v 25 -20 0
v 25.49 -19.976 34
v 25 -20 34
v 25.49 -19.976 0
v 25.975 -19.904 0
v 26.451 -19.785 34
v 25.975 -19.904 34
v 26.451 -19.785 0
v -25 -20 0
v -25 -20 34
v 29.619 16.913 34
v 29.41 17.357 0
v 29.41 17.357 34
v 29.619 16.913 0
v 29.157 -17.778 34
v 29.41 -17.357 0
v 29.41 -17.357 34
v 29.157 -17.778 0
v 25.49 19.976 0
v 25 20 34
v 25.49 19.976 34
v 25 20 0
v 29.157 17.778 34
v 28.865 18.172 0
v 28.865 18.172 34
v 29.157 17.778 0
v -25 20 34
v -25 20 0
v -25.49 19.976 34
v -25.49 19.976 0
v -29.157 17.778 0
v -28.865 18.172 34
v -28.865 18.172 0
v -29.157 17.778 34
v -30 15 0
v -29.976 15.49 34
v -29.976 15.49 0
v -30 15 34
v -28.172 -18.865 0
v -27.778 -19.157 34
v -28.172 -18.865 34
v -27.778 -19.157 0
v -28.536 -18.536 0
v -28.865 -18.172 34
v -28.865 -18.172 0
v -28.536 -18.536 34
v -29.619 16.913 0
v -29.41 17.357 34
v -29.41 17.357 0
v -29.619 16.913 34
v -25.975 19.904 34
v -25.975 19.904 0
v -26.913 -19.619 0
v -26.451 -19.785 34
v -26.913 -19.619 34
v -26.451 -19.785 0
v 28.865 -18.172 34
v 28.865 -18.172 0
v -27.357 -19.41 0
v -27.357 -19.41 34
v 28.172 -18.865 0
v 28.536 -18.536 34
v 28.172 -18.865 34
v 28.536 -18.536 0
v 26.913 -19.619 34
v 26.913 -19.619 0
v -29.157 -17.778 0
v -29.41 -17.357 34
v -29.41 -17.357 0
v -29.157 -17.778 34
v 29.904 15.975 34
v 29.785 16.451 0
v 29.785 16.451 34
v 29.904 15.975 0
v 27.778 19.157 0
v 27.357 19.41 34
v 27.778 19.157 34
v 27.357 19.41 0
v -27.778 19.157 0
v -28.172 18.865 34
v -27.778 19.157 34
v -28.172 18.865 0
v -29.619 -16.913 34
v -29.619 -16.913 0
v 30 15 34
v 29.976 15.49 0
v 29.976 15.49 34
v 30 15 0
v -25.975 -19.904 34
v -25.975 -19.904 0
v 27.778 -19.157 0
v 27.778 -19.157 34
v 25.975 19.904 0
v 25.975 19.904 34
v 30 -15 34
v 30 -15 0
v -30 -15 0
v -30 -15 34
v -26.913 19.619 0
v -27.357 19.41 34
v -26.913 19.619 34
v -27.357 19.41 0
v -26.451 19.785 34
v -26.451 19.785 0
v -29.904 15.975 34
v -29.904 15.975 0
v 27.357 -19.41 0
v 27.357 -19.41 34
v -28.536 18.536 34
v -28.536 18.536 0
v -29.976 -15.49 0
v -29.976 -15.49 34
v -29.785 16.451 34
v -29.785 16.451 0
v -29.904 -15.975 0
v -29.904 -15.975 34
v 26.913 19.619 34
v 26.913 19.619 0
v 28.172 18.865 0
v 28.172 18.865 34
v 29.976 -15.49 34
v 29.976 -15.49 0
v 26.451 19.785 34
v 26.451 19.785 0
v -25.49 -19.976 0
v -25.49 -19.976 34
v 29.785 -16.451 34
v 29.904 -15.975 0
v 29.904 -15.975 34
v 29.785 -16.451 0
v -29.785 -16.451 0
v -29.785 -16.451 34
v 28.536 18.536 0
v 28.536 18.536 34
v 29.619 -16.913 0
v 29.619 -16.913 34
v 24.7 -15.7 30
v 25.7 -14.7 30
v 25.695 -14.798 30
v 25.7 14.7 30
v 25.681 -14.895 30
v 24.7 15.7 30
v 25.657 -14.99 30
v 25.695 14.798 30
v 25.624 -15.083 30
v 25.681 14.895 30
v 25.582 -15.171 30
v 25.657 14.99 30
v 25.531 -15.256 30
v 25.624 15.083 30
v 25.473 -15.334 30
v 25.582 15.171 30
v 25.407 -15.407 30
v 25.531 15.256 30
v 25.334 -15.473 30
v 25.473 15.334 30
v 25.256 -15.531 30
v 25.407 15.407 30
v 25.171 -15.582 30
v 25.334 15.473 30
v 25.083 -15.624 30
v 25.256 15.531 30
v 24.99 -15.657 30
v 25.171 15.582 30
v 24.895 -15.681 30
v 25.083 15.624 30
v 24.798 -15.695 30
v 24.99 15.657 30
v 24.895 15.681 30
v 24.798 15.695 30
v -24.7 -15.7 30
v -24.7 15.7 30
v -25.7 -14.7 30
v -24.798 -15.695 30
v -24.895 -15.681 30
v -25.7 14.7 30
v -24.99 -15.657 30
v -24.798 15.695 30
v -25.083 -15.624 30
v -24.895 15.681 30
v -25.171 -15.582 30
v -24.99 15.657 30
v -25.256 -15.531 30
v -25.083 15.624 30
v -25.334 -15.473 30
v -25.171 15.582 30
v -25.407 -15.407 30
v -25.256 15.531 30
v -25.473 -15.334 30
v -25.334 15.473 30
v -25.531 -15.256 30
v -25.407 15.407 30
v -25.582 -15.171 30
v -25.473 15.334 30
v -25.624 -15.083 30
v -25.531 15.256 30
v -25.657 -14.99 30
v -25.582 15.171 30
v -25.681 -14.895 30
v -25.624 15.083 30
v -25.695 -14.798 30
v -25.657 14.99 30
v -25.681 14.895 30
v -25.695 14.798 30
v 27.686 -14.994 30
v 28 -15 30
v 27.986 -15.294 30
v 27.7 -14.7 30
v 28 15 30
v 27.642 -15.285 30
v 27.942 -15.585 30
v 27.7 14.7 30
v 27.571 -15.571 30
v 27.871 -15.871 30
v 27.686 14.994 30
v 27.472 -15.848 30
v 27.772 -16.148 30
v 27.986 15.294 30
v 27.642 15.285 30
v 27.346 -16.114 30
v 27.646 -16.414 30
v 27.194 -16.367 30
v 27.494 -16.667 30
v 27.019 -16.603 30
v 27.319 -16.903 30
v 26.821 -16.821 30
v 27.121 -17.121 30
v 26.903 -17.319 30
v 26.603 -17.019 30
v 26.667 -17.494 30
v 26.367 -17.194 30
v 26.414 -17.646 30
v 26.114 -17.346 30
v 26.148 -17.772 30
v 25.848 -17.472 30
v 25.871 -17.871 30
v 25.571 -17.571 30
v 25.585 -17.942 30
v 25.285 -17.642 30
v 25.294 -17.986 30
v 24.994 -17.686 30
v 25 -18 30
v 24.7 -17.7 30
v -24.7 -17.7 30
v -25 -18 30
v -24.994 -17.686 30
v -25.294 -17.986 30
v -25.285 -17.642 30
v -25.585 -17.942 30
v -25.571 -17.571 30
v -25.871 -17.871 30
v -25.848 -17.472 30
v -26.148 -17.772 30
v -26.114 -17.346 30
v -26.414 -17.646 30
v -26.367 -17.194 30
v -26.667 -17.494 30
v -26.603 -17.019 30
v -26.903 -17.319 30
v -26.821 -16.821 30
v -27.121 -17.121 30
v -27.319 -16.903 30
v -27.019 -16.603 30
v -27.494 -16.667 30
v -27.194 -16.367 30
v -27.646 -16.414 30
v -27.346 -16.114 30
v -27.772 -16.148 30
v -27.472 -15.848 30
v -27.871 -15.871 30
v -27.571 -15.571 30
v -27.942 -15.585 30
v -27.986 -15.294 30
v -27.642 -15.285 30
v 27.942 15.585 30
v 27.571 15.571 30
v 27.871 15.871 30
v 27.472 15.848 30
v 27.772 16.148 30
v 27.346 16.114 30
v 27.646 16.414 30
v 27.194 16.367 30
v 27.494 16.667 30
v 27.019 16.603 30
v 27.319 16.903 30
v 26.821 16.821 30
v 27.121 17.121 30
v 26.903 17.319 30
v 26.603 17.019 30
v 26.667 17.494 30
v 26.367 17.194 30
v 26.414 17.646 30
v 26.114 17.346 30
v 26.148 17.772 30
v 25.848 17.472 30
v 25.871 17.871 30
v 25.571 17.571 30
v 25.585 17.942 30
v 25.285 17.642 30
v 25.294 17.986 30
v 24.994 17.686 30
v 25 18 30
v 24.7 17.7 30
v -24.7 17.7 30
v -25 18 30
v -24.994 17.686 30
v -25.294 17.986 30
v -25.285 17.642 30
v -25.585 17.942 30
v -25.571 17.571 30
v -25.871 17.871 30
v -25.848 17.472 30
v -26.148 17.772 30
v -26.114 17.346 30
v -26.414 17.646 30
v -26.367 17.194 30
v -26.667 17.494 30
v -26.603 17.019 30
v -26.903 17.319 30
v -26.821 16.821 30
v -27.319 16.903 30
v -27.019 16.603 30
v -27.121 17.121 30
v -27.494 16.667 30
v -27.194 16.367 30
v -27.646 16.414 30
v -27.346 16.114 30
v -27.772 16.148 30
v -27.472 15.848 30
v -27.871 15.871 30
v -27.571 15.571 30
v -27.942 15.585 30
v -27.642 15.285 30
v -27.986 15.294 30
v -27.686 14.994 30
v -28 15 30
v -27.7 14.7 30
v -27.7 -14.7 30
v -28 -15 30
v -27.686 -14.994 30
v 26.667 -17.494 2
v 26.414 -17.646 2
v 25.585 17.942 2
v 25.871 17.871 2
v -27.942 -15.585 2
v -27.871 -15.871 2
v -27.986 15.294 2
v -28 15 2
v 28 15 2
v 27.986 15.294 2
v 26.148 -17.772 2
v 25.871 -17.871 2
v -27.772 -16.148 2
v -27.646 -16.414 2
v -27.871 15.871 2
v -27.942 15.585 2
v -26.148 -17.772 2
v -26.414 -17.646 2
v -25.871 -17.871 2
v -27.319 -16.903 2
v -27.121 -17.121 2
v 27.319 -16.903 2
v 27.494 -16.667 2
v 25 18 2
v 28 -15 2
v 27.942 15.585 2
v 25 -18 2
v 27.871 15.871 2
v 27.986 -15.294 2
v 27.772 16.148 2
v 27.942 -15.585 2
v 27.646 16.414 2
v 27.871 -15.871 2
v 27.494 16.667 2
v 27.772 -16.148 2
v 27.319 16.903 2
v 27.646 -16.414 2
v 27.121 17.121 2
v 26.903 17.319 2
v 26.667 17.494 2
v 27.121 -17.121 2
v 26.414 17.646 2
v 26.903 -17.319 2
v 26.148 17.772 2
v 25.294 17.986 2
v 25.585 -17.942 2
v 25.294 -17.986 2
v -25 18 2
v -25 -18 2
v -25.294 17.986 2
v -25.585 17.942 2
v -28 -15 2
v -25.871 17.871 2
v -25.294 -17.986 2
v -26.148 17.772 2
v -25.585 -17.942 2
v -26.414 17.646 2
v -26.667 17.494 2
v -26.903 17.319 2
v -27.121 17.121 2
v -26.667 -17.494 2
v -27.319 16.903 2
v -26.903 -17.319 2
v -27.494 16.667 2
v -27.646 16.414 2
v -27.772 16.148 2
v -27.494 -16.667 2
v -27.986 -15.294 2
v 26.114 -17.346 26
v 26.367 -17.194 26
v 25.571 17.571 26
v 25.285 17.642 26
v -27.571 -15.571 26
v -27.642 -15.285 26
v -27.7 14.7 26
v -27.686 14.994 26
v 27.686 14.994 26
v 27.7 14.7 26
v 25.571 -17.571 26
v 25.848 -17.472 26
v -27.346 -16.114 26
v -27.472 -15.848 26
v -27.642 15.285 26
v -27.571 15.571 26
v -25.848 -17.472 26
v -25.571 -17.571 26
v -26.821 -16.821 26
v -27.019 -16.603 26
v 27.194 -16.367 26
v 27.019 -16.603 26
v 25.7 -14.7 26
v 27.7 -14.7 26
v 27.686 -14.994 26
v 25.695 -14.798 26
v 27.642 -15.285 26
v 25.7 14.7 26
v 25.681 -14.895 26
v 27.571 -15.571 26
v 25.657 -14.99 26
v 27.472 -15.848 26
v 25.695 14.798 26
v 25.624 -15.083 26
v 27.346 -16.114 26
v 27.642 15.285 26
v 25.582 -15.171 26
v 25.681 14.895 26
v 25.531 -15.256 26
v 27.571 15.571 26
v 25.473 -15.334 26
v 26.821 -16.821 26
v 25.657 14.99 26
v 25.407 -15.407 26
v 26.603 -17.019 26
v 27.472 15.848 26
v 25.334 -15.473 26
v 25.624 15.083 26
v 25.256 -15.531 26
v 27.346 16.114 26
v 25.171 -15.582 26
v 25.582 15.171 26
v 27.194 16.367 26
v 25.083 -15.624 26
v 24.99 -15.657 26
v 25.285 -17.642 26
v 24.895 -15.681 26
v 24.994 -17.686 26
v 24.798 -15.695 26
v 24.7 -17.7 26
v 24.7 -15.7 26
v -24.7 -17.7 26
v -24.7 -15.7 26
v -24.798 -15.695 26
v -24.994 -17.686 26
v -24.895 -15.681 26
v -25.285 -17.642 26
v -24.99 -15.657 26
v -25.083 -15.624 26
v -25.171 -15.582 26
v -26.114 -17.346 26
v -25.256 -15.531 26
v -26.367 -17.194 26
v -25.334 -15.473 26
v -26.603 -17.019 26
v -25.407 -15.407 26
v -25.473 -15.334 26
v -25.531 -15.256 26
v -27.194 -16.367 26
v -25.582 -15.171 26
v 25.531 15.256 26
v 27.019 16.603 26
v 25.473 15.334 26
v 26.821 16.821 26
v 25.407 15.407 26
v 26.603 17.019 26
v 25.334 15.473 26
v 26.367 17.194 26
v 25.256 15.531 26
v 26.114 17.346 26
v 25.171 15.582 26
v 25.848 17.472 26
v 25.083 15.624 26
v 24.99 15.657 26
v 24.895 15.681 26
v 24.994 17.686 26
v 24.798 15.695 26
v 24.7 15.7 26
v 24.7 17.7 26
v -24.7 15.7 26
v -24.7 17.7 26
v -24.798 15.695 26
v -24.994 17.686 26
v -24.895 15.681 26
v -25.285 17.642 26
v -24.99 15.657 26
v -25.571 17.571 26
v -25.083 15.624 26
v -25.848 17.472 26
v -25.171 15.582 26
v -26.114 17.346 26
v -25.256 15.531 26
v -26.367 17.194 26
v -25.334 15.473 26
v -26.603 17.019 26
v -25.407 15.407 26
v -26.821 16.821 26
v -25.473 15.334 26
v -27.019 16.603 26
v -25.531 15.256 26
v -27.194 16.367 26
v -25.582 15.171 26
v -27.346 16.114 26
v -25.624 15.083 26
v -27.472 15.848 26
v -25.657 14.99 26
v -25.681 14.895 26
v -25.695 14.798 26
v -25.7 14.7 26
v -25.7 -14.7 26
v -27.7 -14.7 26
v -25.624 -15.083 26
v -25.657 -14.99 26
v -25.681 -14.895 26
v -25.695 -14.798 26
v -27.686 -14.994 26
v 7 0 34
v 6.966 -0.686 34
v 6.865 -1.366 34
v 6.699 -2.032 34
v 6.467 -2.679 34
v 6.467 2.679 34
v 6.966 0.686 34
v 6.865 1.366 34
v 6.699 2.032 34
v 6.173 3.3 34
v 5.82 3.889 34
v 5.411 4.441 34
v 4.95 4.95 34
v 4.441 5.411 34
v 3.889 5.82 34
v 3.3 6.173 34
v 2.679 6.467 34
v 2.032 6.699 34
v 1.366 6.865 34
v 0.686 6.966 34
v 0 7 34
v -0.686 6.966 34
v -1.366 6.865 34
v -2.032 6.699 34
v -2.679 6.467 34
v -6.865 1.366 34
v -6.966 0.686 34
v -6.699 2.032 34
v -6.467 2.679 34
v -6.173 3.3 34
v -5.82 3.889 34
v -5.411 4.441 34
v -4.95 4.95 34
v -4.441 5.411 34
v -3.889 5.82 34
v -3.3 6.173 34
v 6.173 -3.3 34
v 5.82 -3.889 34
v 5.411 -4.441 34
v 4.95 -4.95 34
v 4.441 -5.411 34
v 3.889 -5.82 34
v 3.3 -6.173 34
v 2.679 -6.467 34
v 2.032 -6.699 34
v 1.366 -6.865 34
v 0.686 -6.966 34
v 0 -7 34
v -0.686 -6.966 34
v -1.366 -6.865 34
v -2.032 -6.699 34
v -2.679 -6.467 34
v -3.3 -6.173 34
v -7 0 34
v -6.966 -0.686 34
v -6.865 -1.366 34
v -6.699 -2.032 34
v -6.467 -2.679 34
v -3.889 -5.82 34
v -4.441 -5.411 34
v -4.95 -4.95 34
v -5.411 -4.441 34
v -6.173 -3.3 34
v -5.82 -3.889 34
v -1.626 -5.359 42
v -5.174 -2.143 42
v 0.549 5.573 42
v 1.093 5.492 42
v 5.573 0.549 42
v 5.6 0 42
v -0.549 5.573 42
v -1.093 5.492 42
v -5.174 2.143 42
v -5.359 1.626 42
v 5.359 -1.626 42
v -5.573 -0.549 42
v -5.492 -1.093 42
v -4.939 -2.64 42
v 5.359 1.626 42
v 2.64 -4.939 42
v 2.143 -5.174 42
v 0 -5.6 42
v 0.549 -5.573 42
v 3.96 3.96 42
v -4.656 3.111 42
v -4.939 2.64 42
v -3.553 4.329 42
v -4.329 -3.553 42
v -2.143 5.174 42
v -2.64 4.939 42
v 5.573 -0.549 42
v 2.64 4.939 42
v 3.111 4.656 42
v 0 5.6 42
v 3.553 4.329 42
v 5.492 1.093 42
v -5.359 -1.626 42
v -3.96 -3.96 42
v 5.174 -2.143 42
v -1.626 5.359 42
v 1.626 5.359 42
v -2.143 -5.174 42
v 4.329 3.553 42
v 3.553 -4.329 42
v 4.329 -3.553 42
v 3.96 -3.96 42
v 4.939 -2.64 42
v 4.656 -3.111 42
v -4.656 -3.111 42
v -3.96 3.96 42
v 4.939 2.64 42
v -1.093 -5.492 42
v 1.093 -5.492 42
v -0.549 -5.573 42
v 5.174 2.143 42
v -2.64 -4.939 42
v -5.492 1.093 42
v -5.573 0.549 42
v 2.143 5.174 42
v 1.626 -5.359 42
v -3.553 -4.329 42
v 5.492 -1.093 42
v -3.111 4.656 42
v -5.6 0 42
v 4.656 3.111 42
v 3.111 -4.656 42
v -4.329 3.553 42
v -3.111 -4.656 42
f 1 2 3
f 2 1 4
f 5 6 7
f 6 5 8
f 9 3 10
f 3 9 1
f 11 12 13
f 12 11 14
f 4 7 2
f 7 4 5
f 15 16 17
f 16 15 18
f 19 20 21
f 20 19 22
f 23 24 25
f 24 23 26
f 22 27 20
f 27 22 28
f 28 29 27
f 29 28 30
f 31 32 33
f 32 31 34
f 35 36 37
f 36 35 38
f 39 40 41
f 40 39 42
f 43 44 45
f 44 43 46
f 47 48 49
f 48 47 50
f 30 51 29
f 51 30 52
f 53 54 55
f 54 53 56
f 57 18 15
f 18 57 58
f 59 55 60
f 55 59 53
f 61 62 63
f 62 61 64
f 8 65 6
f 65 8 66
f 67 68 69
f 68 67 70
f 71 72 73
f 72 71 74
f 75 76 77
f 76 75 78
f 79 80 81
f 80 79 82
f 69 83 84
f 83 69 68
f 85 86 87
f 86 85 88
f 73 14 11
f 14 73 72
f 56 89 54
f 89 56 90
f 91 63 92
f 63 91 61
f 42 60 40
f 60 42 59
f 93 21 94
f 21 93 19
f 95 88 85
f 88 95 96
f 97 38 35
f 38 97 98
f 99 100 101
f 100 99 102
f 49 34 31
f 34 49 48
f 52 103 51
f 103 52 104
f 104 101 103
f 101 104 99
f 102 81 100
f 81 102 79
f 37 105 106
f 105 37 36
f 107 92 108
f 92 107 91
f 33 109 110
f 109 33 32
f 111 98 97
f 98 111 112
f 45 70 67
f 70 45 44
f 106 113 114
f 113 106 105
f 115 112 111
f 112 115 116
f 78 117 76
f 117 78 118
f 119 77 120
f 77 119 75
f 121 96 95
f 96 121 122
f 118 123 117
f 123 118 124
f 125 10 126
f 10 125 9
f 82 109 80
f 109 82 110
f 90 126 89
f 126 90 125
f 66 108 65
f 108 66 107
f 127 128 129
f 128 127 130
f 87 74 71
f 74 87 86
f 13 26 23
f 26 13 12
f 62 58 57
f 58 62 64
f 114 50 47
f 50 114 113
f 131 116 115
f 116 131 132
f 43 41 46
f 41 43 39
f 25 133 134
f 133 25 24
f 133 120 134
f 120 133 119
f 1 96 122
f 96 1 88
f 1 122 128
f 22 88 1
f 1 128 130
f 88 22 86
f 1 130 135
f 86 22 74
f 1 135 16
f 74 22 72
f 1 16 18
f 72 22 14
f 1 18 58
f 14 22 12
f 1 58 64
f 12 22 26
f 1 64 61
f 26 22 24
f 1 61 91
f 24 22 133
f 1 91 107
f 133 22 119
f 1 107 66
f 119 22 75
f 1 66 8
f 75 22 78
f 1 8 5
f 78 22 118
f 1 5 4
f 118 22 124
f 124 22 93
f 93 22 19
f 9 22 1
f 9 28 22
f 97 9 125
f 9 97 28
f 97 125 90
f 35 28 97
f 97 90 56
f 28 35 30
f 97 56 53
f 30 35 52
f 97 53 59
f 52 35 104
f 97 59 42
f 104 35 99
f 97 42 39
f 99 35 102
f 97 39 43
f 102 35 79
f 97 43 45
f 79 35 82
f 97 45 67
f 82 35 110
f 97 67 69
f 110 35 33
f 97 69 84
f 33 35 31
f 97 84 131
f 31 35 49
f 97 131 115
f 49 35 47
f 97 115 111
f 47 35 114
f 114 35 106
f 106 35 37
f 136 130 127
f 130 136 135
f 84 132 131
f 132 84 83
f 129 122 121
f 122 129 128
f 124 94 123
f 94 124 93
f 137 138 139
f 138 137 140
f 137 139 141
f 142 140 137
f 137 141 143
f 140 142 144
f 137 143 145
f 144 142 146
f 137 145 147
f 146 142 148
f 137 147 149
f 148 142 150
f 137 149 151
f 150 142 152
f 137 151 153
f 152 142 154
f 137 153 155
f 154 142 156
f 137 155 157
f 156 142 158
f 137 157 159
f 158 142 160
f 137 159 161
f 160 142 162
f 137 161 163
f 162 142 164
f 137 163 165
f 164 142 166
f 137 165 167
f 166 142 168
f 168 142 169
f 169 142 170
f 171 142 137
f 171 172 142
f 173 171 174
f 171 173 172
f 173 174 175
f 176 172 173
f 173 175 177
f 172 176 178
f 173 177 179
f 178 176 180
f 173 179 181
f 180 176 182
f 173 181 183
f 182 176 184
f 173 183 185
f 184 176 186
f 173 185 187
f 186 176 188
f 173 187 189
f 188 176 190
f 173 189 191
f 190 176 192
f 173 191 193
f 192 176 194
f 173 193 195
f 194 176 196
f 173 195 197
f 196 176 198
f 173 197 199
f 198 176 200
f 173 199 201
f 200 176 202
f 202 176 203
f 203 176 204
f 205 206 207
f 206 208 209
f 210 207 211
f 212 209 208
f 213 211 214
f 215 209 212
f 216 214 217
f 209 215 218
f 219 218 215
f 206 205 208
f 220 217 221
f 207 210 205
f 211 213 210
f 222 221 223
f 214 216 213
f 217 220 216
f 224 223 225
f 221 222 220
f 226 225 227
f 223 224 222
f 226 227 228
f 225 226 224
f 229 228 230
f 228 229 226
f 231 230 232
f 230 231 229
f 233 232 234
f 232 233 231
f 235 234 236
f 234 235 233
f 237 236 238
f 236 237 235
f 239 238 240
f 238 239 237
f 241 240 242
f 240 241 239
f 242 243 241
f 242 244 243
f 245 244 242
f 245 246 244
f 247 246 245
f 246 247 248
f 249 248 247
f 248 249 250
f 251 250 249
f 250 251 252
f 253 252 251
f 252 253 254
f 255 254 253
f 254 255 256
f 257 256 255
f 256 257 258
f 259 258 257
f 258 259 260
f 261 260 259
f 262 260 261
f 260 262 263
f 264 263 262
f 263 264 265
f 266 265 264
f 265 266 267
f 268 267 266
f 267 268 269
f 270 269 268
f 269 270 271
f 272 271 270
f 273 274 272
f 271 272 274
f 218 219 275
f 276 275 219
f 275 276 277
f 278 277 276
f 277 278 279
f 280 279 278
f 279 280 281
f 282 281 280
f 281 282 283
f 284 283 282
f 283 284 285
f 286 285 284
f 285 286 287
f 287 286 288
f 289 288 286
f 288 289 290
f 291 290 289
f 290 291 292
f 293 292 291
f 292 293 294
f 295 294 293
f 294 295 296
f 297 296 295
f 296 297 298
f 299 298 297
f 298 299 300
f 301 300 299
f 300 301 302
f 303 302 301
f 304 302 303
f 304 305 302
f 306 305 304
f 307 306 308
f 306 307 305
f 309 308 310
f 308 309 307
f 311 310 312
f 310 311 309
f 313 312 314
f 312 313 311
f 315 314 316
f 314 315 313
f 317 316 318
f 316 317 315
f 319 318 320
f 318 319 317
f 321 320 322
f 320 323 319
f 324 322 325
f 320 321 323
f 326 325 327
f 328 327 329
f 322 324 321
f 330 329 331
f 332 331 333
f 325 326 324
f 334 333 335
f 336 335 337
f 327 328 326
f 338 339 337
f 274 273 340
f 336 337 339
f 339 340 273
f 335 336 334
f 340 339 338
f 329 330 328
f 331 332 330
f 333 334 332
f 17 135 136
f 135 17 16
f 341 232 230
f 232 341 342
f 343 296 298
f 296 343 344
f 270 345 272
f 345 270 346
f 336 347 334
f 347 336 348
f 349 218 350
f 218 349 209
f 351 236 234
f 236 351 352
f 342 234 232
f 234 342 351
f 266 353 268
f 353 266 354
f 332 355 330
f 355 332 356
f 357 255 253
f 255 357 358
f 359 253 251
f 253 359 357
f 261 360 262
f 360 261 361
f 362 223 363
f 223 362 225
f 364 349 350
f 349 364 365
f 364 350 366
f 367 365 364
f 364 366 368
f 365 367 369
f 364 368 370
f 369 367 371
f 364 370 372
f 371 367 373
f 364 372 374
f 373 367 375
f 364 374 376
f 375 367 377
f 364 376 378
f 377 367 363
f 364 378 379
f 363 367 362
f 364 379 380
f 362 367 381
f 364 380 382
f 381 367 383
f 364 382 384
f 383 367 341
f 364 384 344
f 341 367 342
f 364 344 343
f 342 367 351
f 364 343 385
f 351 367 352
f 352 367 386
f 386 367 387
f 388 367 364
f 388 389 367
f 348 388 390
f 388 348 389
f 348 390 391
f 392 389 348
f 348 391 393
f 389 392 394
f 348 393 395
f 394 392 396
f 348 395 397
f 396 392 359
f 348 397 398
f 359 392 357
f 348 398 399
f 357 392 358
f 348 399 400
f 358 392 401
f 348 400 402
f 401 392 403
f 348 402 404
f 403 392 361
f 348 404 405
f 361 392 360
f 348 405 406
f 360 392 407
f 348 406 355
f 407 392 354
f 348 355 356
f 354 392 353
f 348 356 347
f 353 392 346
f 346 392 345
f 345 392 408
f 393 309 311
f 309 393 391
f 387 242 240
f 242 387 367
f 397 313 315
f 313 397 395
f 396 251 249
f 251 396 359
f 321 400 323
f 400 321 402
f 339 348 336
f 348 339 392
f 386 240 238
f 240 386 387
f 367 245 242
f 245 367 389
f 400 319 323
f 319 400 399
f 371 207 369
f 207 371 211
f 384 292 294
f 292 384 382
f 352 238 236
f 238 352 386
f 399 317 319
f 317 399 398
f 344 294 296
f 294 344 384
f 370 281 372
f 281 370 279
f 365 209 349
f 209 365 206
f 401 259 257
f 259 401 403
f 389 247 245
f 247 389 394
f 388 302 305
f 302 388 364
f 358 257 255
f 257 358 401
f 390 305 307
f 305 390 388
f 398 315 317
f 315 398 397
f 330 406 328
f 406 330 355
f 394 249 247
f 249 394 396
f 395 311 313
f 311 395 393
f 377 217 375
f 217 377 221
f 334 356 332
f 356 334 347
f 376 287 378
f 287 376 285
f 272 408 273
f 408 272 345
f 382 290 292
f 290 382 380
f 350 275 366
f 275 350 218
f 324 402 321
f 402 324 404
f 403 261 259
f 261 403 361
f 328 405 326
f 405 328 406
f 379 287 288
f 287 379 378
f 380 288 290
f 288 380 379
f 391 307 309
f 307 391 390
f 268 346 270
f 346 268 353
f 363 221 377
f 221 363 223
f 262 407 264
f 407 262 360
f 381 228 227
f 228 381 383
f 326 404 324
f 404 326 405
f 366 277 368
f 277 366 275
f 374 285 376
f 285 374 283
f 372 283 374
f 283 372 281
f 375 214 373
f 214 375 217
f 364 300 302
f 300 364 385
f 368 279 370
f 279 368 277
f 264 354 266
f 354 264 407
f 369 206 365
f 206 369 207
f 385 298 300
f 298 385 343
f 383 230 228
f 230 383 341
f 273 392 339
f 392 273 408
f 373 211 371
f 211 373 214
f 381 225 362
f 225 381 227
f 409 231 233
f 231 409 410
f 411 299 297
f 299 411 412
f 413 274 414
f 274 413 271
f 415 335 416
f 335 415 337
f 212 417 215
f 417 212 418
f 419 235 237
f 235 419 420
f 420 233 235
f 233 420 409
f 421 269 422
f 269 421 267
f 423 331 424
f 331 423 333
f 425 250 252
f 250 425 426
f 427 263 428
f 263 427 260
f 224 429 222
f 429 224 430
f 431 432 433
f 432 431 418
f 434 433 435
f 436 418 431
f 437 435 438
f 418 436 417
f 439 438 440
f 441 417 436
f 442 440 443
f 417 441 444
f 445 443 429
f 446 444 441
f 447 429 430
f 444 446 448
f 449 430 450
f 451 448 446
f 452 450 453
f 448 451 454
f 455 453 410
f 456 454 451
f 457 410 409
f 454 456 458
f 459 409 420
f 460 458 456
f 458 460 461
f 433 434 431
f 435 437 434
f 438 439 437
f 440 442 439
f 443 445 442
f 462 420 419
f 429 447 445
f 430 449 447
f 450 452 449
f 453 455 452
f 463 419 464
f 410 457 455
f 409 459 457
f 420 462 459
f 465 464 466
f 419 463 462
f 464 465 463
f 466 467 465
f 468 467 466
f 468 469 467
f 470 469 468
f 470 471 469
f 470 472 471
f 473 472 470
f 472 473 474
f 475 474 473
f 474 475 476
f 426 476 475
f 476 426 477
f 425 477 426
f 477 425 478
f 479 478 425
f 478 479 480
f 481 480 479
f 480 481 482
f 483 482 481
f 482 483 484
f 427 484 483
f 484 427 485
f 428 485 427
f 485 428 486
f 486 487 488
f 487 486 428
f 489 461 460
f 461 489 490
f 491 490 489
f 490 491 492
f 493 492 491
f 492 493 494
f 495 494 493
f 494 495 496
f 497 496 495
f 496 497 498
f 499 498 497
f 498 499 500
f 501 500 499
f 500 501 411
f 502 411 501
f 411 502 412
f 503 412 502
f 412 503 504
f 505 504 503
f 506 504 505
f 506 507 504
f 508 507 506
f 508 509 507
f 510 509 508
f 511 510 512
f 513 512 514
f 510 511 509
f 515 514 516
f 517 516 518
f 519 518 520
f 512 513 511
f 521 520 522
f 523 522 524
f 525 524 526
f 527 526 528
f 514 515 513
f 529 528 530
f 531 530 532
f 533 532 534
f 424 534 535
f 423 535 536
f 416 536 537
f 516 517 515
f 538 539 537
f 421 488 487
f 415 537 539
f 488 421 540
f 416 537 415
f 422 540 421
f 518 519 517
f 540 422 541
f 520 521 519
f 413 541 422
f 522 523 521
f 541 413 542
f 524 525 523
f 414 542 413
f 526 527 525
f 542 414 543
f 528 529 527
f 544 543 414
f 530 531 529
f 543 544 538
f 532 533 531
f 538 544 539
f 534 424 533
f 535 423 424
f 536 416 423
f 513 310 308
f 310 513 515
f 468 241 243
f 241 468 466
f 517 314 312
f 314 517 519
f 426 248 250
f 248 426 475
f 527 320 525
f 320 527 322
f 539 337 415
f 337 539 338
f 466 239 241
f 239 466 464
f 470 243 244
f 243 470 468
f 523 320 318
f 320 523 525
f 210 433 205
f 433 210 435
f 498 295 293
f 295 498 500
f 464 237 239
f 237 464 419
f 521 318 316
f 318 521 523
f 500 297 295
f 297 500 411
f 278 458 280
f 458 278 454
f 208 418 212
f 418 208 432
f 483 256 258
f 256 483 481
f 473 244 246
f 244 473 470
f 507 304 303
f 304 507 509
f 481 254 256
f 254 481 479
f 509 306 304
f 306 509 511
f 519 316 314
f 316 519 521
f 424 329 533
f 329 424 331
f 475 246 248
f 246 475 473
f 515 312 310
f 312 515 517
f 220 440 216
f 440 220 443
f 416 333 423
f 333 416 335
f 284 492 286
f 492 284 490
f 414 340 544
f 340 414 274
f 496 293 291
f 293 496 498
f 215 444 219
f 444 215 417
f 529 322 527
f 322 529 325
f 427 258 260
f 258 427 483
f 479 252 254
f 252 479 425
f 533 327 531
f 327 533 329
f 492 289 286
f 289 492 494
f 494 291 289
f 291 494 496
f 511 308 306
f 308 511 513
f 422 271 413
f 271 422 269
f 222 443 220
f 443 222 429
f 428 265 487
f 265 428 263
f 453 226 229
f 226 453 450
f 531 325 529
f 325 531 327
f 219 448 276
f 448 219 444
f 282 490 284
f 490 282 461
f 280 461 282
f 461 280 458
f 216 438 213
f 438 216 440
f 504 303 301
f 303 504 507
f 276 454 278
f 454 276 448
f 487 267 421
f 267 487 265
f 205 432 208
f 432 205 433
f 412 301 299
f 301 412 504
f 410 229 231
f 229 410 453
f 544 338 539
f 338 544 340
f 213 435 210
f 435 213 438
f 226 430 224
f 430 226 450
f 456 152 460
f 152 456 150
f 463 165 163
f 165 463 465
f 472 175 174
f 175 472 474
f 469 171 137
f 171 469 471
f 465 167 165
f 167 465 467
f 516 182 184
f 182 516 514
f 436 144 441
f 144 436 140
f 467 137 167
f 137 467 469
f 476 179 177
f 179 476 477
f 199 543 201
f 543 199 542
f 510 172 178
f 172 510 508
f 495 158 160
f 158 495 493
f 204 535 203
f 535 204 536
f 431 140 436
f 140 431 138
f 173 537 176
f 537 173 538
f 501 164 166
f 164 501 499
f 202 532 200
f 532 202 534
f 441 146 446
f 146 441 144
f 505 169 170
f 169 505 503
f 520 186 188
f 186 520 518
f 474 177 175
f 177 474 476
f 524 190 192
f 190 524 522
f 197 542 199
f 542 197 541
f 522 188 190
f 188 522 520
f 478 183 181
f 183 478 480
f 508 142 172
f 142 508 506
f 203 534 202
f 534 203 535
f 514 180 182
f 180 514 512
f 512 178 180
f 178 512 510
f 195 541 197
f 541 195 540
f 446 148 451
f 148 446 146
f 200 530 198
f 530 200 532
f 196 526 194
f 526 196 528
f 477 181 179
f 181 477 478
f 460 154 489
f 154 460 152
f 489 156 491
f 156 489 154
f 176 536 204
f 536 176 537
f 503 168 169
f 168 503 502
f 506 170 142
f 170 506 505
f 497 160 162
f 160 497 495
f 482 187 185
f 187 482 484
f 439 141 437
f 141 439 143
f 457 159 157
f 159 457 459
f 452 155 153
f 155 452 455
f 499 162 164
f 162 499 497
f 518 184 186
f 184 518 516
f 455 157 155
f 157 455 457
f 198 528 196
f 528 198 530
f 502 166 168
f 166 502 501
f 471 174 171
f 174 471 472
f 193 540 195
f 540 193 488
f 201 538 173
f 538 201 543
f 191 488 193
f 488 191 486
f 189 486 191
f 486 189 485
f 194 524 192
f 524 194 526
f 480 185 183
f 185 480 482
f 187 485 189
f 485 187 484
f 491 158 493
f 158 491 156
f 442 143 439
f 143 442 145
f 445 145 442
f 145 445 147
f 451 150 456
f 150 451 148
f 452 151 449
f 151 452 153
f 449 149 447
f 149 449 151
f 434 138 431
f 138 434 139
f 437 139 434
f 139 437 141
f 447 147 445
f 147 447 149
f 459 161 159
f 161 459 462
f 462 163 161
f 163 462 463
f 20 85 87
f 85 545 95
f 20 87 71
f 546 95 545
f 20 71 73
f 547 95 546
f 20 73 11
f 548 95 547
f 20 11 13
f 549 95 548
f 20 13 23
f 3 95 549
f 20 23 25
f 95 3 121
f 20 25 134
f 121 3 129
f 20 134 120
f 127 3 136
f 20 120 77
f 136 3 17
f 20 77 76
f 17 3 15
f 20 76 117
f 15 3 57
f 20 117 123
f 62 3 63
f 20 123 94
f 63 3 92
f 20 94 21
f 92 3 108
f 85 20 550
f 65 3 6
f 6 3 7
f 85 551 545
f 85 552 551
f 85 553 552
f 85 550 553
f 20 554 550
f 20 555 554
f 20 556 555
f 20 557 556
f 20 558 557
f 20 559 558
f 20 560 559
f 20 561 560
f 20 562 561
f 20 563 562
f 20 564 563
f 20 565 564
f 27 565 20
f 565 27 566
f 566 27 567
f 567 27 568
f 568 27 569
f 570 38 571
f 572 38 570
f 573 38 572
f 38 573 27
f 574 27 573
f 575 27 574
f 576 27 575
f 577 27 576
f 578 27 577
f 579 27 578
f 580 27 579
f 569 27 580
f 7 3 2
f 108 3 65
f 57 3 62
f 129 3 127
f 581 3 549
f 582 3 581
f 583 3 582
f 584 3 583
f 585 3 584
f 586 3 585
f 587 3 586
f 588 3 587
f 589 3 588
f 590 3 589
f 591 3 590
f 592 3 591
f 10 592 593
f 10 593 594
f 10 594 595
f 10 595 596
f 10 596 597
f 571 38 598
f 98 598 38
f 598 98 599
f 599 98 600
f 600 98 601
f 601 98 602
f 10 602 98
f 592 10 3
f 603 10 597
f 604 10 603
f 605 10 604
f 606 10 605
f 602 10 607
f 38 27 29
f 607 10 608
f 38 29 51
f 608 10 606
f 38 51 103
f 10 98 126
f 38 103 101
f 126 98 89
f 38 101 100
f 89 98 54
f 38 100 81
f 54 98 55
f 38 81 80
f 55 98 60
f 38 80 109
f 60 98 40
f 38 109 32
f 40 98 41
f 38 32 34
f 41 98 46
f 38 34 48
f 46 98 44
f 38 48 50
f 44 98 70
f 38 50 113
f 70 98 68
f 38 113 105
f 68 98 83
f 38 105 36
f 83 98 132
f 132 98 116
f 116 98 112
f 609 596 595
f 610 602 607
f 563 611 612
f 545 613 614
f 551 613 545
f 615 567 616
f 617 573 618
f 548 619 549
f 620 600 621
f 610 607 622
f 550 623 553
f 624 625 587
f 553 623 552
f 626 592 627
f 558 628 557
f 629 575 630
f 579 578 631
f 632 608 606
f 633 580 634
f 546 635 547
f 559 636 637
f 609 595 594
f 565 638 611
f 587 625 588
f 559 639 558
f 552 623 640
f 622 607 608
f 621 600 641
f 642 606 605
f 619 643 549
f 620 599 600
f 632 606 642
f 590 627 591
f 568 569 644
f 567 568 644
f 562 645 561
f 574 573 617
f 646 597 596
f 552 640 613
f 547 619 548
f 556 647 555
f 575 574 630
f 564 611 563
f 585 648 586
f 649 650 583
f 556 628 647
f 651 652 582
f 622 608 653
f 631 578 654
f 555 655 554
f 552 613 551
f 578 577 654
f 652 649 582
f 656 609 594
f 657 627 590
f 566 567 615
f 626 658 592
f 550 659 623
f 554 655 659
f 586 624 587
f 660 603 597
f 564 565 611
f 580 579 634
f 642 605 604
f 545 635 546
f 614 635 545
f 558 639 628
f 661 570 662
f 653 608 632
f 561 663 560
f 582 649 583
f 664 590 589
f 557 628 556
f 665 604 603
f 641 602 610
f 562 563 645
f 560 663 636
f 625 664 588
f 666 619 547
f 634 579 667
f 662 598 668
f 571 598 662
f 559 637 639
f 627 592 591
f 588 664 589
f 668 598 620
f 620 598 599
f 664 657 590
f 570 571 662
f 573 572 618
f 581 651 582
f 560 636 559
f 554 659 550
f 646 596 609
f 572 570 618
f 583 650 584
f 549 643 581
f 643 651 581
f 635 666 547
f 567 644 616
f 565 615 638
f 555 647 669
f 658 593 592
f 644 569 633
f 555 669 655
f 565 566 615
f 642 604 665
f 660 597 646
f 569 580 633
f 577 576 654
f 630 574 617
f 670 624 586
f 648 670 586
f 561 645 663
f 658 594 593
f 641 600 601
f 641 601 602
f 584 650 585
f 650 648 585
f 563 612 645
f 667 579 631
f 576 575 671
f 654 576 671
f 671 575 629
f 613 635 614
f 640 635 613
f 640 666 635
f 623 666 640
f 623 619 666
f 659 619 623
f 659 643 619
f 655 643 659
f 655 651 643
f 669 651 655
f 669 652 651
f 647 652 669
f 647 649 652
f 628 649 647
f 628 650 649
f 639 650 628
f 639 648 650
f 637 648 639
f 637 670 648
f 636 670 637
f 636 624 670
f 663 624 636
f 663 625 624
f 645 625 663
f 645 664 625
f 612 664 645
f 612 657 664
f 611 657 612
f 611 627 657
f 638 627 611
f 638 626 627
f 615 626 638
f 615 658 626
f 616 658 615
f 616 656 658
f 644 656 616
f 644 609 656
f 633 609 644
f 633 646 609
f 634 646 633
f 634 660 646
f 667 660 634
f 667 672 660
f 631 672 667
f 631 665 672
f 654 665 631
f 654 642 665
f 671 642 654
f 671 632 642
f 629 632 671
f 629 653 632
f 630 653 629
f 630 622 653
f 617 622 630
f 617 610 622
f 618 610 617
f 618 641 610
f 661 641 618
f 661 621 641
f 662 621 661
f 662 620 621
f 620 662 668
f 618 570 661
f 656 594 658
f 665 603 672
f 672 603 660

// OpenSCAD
// Small box with a lid and a knob: an assembly of parts that touch.
// OpenSCAD joins the parts into one solid. CoCAD finds them from the module
// calls in the assembly: box, lid and knob.
// Try Part colors, Explode and Section in the Model tab.

/* [Box] */
width = 60; // [30:1:120]
depth = 40; // [20:1:120]
height = 30; // [10:1:80]
wall = 2; // [1:0.2:5]
corner = 5; // [0:0.5:12]

/* [Lid] */
lid_height = 4; // [2:0.5:12]
// Depth of the lip that holds the lid in the box
lip = 4; // [0:0.5:10]
// Gap between the lip and the box wall
clearance = 0.3; // [0:0.05:1]
knob_d = 14; // [6:1:30]
knob_h = 8; // [3:1:20]

$fn = 64;

// A rounded rectangle, centered on the origin, from z = 0 to z = h.
module rounded(w, d, h, r) {
    r = max(0.01, min(r, min(w, d) / 2 - 0.01));
    linear_extrude(h) offset(r = r) square([w - 2 * r, d - 2 * r], center = true);
}

module box() {
    difference() {
        rounded(width, depth, height, corner);
        translate([0, 0, wall])
            rounded(width - 2 * wall, depth - 2 * wall, height, corner - wall);
    }
}

// union() keeps the plate and the lip together as one part in CoCAD.
module lid() {
    inner = 2 * (wall + clearance);
    union() {
        translate([0, 0, height]) rounded(width, depth, lid_height, corner);
        if (lip > 0)
            translate([0, 0, height - lip])
                difference() {
                    rounded(width - inner, depth - inner, lip, corner - wall);
                    translate([0, 0, -1])
                        rounded(width - inner - 2 * wall, depth - inner - 2 * wall, lip + 2,
                                corner - 2 * wall);
                }
    }
}

module knob() {
    translate([0, 0, height + lid_height])
        cylinder(d1 = knob_d, d2 = knob_d * 0.8, h = knob_h);
}

box();
lid();
knob();
